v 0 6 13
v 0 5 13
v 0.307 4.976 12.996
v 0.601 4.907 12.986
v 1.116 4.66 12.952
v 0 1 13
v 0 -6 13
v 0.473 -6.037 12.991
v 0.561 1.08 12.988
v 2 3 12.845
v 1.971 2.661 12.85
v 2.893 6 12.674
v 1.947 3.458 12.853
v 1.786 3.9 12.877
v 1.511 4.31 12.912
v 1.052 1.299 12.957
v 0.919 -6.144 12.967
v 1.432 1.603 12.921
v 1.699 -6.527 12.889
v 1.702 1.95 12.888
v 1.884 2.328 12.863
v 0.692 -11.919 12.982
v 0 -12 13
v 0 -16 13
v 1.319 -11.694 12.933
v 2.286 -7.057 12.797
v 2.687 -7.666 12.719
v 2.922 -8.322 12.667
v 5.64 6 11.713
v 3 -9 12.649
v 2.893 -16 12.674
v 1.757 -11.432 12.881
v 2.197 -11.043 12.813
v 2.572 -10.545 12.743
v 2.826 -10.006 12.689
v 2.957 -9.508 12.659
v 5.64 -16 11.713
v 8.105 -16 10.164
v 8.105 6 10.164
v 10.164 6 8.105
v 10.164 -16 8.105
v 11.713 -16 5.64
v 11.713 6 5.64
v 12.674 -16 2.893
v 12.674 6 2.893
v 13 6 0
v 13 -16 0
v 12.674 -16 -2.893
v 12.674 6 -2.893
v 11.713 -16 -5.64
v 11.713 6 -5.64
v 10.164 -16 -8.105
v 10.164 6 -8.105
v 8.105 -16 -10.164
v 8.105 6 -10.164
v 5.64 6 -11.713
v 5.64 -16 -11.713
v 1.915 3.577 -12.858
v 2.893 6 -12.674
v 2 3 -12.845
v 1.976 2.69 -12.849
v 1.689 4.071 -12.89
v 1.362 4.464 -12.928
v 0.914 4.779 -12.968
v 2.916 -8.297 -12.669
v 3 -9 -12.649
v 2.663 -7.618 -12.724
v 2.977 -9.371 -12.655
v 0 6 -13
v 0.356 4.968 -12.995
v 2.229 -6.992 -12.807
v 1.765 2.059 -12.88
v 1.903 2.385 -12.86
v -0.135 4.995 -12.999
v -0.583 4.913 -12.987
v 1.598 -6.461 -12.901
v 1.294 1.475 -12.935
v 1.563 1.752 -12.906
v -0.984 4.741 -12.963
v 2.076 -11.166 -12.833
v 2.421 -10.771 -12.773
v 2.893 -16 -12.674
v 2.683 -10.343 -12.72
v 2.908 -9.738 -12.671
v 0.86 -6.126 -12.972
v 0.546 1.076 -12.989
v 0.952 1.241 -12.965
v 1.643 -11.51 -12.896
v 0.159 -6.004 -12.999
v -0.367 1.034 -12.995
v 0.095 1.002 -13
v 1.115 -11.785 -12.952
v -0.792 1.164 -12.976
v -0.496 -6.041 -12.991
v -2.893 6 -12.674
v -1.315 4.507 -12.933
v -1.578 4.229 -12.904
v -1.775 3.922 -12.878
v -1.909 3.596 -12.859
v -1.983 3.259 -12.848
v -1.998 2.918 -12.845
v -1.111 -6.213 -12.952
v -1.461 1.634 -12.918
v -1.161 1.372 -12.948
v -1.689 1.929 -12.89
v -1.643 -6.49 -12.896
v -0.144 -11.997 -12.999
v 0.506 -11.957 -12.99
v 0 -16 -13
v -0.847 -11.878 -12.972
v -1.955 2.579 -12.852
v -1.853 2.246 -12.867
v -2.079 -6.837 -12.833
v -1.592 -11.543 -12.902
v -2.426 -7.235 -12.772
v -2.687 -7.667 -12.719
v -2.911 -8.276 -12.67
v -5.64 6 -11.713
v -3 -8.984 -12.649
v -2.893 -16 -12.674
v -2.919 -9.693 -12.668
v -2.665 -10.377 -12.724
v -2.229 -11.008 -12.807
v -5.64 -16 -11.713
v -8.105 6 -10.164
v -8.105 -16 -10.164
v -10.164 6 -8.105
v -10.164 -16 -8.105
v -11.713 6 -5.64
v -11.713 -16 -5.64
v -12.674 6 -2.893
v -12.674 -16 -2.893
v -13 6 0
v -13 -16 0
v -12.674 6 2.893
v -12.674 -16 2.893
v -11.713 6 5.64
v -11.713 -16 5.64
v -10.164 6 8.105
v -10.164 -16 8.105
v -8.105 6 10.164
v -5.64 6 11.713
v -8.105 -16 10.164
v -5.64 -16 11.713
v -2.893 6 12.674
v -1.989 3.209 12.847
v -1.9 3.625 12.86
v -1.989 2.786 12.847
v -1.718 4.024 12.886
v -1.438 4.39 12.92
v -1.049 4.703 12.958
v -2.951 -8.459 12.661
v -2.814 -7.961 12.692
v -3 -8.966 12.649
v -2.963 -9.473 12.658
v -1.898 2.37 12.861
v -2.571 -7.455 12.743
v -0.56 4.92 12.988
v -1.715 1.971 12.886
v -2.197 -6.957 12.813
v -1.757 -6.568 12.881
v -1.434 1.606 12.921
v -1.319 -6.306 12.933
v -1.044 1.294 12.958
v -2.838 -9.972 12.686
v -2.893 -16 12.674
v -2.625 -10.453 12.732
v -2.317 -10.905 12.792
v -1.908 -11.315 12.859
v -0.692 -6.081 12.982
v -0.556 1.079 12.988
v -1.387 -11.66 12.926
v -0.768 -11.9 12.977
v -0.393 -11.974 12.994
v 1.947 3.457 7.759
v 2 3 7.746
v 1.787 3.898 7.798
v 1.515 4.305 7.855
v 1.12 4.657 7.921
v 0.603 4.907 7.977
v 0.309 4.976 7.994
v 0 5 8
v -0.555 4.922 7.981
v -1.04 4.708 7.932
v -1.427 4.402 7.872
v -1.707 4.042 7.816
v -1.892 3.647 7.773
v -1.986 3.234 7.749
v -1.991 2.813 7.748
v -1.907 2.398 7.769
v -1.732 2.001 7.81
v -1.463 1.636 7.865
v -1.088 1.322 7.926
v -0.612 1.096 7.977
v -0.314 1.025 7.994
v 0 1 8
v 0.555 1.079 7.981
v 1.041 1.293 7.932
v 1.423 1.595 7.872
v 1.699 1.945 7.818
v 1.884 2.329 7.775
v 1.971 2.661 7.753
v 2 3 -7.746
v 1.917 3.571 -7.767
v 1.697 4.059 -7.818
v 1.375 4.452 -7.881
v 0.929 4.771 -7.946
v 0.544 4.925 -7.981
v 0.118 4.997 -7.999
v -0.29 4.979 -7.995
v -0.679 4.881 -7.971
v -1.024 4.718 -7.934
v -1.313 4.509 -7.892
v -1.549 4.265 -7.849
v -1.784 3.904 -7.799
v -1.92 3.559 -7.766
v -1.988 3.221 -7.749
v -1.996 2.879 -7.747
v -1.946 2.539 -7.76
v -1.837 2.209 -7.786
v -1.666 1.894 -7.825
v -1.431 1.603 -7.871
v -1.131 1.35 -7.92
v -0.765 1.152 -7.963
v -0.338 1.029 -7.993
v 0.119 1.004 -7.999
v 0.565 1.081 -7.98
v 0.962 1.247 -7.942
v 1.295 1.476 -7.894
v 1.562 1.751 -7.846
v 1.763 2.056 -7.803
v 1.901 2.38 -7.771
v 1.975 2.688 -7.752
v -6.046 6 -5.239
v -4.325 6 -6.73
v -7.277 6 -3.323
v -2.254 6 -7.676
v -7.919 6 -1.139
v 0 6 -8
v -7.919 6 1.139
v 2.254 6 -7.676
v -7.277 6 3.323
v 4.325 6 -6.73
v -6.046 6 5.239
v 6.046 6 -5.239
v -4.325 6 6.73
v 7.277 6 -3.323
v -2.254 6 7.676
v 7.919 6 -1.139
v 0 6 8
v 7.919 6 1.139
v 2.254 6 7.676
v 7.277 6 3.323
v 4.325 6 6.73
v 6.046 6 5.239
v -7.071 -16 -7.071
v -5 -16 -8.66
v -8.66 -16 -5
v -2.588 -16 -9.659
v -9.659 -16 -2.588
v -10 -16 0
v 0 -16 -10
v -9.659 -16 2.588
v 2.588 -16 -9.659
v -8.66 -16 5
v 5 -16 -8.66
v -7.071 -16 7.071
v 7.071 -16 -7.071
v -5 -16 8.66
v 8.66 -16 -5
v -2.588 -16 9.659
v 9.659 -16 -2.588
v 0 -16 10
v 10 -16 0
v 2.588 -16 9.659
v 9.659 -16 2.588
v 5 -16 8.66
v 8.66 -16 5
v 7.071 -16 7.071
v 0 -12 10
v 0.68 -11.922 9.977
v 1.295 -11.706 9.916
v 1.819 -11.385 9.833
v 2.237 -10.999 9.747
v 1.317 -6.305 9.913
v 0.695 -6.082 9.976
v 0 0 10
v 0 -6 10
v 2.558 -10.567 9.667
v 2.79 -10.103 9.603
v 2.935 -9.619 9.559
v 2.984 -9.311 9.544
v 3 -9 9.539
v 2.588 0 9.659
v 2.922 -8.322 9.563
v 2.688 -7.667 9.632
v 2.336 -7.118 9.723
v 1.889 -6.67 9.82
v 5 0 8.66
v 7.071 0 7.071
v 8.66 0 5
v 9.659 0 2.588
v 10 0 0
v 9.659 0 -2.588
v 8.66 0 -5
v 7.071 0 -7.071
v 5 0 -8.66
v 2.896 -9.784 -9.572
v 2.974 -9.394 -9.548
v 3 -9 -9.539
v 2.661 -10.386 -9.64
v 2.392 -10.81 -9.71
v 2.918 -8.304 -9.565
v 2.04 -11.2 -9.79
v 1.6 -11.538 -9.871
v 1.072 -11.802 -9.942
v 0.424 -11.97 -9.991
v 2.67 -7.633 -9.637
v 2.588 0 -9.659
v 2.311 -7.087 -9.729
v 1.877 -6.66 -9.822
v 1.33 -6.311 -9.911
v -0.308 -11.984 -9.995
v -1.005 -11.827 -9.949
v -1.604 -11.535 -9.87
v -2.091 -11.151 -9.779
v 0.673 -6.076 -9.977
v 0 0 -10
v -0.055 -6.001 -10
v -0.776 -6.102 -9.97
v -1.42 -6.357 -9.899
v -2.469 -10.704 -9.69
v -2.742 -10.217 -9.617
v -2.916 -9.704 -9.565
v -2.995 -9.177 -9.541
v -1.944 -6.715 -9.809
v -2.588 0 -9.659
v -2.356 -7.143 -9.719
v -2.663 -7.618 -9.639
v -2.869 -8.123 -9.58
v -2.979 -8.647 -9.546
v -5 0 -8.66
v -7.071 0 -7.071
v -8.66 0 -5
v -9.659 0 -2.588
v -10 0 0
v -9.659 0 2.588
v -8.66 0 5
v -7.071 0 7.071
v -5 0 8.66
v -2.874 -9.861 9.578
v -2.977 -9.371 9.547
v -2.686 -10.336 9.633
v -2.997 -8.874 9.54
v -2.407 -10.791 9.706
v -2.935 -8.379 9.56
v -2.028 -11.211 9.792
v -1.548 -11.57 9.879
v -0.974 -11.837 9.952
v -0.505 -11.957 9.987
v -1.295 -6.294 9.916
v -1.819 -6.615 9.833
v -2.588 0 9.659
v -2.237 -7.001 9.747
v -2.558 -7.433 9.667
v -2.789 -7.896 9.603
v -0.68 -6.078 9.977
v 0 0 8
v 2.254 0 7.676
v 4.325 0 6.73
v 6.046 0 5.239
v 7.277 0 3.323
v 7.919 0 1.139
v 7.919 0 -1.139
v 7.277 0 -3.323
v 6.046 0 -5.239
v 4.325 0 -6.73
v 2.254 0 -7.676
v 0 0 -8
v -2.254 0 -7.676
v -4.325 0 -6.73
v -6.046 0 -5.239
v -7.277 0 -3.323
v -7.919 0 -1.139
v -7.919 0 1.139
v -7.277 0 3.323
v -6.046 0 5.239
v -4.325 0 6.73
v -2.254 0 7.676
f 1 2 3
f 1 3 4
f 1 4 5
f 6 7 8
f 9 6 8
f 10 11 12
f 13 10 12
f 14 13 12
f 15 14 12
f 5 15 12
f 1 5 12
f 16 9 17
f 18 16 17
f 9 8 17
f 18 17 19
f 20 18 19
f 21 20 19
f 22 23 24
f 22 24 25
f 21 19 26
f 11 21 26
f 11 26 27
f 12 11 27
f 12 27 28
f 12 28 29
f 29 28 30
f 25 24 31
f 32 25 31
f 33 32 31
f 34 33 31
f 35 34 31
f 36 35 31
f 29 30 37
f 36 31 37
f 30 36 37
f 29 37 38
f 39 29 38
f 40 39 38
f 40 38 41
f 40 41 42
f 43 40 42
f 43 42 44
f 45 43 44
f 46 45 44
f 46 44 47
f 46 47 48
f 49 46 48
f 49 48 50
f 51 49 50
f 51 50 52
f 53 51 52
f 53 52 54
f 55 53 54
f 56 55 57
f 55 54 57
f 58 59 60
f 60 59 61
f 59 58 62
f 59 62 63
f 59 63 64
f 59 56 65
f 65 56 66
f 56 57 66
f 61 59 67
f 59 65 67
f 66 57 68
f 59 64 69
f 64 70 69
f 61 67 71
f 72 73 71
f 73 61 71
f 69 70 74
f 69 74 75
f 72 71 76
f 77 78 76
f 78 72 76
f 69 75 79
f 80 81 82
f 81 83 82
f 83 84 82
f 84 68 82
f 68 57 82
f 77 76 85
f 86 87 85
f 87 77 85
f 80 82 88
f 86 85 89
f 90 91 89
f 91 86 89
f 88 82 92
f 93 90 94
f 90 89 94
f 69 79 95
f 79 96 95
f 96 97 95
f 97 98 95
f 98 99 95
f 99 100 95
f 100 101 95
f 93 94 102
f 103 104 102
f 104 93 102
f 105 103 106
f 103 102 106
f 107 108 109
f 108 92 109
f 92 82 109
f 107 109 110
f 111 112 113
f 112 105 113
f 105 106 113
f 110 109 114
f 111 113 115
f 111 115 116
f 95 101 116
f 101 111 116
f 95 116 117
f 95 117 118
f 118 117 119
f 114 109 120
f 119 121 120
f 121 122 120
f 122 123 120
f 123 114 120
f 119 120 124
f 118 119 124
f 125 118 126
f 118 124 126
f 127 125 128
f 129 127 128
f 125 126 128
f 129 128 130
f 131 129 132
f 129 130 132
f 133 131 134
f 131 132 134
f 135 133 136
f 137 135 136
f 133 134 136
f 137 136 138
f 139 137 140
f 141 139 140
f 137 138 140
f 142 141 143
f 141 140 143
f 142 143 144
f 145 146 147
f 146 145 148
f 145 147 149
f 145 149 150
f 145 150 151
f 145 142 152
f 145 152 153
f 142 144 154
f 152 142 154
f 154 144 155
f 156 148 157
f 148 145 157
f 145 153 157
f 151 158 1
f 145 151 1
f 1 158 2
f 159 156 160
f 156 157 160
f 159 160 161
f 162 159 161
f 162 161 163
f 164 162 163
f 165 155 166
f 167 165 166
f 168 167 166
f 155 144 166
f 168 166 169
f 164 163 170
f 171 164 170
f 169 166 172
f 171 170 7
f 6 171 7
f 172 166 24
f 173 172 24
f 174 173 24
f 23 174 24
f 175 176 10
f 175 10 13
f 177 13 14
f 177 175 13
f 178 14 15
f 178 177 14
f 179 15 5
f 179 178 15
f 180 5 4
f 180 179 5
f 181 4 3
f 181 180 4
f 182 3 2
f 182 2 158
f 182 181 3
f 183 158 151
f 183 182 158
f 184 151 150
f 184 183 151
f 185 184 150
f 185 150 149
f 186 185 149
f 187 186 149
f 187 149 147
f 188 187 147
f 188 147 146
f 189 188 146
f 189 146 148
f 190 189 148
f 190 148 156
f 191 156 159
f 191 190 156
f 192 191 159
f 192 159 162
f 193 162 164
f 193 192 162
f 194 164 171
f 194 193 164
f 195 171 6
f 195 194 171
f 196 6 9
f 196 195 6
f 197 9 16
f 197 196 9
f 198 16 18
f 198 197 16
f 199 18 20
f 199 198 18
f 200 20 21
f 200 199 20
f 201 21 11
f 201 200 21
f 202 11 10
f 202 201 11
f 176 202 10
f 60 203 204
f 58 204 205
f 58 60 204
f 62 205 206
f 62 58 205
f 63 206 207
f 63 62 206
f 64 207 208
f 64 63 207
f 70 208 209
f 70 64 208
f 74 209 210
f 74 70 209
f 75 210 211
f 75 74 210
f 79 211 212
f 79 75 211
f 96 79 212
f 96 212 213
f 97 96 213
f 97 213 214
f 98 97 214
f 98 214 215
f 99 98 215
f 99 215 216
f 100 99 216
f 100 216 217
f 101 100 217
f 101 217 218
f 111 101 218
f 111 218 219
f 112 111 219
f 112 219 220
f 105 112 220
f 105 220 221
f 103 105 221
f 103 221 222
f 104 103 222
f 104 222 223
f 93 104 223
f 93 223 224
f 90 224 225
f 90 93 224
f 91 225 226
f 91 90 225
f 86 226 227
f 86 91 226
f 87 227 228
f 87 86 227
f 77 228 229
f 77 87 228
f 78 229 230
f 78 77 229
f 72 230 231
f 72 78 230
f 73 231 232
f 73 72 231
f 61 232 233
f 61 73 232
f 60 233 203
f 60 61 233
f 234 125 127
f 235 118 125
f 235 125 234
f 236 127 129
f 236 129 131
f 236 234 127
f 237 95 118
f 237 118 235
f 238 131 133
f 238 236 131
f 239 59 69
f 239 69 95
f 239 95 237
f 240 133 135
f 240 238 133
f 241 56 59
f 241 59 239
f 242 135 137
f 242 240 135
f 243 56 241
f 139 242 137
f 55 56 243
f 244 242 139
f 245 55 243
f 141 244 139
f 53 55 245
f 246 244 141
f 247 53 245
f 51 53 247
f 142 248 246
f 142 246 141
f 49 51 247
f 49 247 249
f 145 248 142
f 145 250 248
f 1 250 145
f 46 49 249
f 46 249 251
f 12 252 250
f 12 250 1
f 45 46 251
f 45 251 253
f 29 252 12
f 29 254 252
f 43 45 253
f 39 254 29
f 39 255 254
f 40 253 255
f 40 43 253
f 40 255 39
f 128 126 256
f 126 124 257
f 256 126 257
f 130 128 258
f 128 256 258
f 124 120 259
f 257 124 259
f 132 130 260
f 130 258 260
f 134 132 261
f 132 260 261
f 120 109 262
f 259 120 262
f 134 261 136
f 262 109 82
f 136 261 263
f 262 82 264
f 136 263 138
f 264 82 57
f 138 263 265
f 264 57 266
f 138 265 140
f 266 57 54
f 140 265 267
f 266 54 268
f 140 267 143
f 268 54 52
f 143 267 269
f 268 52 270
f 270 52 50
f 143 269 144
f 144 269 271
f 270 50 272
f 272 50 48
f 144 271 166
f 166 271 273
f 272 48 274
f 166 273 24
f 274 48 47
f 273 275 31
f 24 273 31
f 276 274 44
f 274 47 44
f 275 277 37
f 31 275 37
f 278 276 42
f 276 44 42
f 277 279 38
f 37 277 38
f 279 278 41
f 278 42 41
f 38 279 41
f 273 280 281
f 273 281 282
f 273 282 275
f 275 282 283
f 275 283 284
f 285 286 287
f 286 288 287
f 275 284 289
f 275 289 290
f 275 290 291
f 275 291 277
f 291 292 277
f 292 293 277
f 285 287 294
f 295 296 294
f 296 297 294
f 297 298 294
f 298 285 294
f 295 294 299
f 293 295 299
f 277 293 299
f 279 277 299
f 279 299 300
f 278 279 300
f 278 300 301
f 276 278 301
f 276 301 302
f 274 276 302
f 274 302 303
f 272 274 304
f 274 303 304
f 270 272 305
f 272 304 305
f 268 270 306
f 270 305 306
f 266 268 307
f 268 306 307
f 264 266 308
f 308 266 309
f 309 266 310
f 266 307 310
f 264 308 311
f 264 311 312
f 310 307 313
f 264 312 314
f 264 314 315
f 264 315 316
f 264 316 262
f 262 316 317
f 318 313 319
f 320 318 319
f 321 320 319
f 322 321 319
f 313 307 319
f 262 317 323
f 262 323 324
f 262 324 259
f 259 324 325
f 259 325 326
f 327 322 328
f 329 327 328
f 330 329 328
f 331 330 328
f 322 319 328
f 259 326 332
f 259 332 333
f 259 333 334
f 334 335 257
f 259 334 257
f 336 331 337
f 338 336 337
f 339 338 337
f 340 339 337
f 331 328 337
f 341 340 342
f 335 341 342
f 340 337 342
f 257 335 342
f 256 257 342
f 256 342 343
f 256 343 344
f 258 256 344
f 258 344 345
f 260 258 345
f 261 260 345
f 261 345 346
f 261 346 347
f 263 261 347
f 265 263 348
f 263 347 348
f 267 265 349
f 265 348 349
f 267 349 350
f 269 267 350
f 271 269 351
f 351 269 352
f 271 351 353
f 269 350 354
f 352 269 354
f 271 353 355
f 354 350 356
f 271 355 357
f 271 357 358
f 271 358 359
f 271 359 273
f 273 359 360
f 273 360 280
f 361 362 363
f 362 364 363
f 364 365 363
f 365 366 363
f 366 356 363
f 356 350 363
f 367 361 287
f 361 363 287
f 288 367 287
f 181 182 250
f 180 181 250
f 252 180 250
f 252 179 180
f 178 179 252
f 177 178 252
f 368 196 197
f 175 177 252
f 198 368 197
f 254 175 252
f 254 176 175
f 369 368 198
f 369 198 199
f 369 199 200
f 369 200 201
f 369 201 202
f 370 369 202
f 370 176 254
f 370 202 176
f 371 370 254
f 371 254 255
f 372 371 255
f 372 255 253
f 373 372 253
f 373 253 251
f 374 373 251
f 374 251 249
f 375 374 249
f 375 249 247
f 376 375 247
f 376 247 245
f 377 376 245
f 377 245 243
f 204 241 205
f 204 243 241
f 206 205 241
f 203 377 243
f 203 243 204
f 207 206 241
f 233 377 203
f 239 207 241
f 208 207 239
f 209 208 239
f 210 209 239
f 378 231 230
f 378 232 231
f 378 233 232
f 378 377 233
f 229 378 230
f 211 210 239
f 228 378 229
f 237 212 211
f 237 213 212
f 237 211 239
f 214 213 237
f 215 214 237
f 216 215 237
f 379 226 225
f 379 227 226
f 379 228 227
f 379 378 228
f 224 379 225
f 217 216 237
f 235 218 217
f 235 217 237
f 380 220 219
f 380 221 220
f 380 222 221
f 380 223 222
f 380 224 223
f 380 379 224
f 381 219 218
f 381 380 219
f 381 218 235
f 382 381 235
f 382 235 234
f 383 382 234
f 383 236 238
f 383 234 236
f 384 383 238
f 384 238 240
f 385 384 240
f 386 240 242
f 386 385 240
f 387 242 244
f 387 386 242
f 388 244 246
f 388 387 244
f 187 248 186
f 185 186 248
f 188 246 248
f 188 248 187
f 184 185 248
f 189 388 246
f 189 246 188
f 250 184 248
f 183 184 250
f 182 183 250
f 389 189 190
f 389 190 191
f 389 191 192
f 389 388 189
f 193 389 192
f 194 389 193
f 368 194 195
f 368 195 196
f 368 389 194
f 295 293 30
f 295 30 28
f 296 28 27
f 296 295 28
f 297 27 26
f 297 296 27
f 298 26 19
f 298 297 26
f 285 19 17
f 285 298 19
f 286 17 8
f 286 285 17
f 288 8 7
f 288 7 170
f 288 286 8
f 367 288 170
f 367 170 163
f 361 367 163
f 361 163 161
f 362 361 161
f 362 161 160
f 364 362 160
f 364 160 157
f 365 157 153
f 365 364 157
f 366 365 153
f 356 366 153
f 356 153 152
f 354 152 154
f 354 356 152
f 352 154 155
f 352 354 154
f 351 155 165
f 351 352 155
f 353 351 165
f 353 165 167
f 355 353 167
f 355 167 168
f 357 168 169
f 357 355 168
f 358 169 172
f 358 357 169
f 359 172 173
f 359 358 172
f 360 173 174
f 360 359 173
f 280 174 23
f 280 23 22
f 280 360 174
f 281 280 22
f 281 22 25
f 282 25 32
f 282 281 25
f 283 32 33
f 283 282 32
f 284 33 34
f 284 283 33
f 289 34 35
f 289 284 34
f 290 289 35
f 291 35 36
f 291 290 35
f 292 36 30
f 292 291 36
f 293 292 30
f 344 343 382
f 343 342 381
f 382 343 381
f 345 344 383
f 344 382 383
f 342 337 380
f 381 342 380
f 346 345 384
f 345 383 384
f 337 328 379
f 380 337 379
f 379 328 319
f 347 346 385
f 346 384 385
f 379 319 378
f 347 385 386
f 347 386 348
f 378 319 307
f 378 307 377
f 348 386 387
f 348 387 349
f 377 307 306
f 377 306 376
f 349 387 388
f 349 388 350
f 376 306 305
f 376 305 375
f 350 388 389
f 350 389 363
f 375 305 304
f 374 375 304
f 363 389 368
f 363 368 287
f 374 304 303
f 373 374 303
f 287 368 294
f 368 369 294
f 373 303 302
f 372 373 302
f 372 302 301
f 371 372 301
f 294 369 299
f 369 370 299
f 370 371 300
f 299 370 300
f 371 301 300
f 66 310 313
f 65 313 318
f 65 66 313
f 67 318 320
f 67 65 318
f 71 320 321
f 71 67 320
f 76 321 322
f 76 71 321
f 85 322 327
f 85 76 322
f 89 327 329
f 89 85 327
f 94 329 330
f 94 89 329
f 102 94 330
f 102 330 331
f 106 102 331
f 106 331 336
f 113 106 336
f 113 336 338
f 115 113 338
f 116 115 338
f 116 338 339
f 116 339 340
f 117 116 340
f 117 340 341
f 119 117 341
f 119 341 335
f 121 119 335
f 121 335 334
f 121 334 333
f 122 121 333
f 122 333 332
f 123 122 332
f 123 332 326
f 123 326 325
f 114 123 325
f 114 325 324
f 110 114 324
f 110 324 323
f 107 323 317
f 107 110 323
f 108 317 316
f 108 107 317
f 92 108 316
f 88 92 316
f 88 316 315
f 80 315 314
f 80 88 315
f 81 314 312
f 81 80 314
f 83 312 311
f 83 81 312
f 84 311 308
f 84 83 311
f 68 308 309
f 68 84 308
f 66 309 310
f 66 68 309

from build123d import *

# Parameters (mm, degrees)
EXTRUDE_START            = -16
SKETCH_1_R               = 13
EXTRUDE_1_DEPTH          = 22
CUT_EXTRUDE_1_REACH      = 26.372
SKETCH_2_R               = 8
CUT_EXTRUDE_2_REACH      = 26.372
SKETCH_3_R               = 10
CUT_EXTRUDE_3_DEPTH      = 25.372115214
CUT_EXTRUDE_3_DEPTH_BACK = 25.372115214
SKETCH_4_R               = 3
SKETCH_4_R_2             = 2


with BuildPart() as part:
    # 草图1 → 凸台-拉伸1 (new body)
    with BuildSketch(Plane(origin=(0, 0, 0), x_dir=(1, 0, 0), z_dir=(0, 1, 0)).offset(EXTRUDE_START)):
        with Locations(Location((0, 0, 0), (0, 0, 270))):
            Circle(SKETCH_1_R)
    extrude(amount=EXTRUDE_1_DEPTH)

    # 草图2 → 切除-拉伸1 (cut, up to next)
    with BuildSketch(Plane(origin=(0, 0, 0), x_dir=(1, 0, 0), z_dir=(0, 1, 0)), mode=Mode.PRIVATE) as cut_extrude_1_sk1:
        with Locations(Location((0, 0, 0), (0, 0, 270))):
            Circle(SKETCH_2_R)
    cut_extrude_1_tool1 = extrude(cut_extrude_1_sk1.sketch, amount=CUT_EXTRUDE_1_REACH, mode=Mode.PRIVATE) & part.part
    add(cut_extrude_1_tool1.solids().sort_by_distance((0, 0, 0))[0], mode=Mode.SUBTRACT)

    # 草图3 → 切除-拉伸2 (cut, up to next)
    with BuildSketch(Plane(origin=(0, 0, 0), x_dir=(1, 0, 0), z_dir=(0, 1, 0)), mode=Mode.PRIVATE) as cut_extrude_2_sk1:
        with Locations(Location((0, 0, 0), (0, 0, 270))):
            Circle(SKETCH_3_R)
    cut_extrude_2_tool1 = extrude(cut_extrude_2_sk1.sketch, amount=-CUT_EXTRUDE_2_REACH, mode=Mode.PRIVATE) & part.part
    add(cut_extrude_2_tool1.solids().sort_by_distance((0, 0, 0))[0], mode=Mode.SUBTRACT)

    # 草图4 → 切除-拉伸3 (cut, two sides: drawn at the far end of the back side and taken through both)
    with BuildSketch(Plane.XY.offset(-CUT_EXTRUDE_3_DEPTH_BACK)):
        with Locations((0, -9)):
            Circle(SKETCH_4_R)
        with Locations((0, 3)):
            Circle(SKETCH_4_R_2)
    extrude(amount=CUT_EXTRUDE_3_DEPTH + CUT_EXTRUDE_3_DEPTH_BACK, mode=Mode.SUBTRACT)


solid = part.part
